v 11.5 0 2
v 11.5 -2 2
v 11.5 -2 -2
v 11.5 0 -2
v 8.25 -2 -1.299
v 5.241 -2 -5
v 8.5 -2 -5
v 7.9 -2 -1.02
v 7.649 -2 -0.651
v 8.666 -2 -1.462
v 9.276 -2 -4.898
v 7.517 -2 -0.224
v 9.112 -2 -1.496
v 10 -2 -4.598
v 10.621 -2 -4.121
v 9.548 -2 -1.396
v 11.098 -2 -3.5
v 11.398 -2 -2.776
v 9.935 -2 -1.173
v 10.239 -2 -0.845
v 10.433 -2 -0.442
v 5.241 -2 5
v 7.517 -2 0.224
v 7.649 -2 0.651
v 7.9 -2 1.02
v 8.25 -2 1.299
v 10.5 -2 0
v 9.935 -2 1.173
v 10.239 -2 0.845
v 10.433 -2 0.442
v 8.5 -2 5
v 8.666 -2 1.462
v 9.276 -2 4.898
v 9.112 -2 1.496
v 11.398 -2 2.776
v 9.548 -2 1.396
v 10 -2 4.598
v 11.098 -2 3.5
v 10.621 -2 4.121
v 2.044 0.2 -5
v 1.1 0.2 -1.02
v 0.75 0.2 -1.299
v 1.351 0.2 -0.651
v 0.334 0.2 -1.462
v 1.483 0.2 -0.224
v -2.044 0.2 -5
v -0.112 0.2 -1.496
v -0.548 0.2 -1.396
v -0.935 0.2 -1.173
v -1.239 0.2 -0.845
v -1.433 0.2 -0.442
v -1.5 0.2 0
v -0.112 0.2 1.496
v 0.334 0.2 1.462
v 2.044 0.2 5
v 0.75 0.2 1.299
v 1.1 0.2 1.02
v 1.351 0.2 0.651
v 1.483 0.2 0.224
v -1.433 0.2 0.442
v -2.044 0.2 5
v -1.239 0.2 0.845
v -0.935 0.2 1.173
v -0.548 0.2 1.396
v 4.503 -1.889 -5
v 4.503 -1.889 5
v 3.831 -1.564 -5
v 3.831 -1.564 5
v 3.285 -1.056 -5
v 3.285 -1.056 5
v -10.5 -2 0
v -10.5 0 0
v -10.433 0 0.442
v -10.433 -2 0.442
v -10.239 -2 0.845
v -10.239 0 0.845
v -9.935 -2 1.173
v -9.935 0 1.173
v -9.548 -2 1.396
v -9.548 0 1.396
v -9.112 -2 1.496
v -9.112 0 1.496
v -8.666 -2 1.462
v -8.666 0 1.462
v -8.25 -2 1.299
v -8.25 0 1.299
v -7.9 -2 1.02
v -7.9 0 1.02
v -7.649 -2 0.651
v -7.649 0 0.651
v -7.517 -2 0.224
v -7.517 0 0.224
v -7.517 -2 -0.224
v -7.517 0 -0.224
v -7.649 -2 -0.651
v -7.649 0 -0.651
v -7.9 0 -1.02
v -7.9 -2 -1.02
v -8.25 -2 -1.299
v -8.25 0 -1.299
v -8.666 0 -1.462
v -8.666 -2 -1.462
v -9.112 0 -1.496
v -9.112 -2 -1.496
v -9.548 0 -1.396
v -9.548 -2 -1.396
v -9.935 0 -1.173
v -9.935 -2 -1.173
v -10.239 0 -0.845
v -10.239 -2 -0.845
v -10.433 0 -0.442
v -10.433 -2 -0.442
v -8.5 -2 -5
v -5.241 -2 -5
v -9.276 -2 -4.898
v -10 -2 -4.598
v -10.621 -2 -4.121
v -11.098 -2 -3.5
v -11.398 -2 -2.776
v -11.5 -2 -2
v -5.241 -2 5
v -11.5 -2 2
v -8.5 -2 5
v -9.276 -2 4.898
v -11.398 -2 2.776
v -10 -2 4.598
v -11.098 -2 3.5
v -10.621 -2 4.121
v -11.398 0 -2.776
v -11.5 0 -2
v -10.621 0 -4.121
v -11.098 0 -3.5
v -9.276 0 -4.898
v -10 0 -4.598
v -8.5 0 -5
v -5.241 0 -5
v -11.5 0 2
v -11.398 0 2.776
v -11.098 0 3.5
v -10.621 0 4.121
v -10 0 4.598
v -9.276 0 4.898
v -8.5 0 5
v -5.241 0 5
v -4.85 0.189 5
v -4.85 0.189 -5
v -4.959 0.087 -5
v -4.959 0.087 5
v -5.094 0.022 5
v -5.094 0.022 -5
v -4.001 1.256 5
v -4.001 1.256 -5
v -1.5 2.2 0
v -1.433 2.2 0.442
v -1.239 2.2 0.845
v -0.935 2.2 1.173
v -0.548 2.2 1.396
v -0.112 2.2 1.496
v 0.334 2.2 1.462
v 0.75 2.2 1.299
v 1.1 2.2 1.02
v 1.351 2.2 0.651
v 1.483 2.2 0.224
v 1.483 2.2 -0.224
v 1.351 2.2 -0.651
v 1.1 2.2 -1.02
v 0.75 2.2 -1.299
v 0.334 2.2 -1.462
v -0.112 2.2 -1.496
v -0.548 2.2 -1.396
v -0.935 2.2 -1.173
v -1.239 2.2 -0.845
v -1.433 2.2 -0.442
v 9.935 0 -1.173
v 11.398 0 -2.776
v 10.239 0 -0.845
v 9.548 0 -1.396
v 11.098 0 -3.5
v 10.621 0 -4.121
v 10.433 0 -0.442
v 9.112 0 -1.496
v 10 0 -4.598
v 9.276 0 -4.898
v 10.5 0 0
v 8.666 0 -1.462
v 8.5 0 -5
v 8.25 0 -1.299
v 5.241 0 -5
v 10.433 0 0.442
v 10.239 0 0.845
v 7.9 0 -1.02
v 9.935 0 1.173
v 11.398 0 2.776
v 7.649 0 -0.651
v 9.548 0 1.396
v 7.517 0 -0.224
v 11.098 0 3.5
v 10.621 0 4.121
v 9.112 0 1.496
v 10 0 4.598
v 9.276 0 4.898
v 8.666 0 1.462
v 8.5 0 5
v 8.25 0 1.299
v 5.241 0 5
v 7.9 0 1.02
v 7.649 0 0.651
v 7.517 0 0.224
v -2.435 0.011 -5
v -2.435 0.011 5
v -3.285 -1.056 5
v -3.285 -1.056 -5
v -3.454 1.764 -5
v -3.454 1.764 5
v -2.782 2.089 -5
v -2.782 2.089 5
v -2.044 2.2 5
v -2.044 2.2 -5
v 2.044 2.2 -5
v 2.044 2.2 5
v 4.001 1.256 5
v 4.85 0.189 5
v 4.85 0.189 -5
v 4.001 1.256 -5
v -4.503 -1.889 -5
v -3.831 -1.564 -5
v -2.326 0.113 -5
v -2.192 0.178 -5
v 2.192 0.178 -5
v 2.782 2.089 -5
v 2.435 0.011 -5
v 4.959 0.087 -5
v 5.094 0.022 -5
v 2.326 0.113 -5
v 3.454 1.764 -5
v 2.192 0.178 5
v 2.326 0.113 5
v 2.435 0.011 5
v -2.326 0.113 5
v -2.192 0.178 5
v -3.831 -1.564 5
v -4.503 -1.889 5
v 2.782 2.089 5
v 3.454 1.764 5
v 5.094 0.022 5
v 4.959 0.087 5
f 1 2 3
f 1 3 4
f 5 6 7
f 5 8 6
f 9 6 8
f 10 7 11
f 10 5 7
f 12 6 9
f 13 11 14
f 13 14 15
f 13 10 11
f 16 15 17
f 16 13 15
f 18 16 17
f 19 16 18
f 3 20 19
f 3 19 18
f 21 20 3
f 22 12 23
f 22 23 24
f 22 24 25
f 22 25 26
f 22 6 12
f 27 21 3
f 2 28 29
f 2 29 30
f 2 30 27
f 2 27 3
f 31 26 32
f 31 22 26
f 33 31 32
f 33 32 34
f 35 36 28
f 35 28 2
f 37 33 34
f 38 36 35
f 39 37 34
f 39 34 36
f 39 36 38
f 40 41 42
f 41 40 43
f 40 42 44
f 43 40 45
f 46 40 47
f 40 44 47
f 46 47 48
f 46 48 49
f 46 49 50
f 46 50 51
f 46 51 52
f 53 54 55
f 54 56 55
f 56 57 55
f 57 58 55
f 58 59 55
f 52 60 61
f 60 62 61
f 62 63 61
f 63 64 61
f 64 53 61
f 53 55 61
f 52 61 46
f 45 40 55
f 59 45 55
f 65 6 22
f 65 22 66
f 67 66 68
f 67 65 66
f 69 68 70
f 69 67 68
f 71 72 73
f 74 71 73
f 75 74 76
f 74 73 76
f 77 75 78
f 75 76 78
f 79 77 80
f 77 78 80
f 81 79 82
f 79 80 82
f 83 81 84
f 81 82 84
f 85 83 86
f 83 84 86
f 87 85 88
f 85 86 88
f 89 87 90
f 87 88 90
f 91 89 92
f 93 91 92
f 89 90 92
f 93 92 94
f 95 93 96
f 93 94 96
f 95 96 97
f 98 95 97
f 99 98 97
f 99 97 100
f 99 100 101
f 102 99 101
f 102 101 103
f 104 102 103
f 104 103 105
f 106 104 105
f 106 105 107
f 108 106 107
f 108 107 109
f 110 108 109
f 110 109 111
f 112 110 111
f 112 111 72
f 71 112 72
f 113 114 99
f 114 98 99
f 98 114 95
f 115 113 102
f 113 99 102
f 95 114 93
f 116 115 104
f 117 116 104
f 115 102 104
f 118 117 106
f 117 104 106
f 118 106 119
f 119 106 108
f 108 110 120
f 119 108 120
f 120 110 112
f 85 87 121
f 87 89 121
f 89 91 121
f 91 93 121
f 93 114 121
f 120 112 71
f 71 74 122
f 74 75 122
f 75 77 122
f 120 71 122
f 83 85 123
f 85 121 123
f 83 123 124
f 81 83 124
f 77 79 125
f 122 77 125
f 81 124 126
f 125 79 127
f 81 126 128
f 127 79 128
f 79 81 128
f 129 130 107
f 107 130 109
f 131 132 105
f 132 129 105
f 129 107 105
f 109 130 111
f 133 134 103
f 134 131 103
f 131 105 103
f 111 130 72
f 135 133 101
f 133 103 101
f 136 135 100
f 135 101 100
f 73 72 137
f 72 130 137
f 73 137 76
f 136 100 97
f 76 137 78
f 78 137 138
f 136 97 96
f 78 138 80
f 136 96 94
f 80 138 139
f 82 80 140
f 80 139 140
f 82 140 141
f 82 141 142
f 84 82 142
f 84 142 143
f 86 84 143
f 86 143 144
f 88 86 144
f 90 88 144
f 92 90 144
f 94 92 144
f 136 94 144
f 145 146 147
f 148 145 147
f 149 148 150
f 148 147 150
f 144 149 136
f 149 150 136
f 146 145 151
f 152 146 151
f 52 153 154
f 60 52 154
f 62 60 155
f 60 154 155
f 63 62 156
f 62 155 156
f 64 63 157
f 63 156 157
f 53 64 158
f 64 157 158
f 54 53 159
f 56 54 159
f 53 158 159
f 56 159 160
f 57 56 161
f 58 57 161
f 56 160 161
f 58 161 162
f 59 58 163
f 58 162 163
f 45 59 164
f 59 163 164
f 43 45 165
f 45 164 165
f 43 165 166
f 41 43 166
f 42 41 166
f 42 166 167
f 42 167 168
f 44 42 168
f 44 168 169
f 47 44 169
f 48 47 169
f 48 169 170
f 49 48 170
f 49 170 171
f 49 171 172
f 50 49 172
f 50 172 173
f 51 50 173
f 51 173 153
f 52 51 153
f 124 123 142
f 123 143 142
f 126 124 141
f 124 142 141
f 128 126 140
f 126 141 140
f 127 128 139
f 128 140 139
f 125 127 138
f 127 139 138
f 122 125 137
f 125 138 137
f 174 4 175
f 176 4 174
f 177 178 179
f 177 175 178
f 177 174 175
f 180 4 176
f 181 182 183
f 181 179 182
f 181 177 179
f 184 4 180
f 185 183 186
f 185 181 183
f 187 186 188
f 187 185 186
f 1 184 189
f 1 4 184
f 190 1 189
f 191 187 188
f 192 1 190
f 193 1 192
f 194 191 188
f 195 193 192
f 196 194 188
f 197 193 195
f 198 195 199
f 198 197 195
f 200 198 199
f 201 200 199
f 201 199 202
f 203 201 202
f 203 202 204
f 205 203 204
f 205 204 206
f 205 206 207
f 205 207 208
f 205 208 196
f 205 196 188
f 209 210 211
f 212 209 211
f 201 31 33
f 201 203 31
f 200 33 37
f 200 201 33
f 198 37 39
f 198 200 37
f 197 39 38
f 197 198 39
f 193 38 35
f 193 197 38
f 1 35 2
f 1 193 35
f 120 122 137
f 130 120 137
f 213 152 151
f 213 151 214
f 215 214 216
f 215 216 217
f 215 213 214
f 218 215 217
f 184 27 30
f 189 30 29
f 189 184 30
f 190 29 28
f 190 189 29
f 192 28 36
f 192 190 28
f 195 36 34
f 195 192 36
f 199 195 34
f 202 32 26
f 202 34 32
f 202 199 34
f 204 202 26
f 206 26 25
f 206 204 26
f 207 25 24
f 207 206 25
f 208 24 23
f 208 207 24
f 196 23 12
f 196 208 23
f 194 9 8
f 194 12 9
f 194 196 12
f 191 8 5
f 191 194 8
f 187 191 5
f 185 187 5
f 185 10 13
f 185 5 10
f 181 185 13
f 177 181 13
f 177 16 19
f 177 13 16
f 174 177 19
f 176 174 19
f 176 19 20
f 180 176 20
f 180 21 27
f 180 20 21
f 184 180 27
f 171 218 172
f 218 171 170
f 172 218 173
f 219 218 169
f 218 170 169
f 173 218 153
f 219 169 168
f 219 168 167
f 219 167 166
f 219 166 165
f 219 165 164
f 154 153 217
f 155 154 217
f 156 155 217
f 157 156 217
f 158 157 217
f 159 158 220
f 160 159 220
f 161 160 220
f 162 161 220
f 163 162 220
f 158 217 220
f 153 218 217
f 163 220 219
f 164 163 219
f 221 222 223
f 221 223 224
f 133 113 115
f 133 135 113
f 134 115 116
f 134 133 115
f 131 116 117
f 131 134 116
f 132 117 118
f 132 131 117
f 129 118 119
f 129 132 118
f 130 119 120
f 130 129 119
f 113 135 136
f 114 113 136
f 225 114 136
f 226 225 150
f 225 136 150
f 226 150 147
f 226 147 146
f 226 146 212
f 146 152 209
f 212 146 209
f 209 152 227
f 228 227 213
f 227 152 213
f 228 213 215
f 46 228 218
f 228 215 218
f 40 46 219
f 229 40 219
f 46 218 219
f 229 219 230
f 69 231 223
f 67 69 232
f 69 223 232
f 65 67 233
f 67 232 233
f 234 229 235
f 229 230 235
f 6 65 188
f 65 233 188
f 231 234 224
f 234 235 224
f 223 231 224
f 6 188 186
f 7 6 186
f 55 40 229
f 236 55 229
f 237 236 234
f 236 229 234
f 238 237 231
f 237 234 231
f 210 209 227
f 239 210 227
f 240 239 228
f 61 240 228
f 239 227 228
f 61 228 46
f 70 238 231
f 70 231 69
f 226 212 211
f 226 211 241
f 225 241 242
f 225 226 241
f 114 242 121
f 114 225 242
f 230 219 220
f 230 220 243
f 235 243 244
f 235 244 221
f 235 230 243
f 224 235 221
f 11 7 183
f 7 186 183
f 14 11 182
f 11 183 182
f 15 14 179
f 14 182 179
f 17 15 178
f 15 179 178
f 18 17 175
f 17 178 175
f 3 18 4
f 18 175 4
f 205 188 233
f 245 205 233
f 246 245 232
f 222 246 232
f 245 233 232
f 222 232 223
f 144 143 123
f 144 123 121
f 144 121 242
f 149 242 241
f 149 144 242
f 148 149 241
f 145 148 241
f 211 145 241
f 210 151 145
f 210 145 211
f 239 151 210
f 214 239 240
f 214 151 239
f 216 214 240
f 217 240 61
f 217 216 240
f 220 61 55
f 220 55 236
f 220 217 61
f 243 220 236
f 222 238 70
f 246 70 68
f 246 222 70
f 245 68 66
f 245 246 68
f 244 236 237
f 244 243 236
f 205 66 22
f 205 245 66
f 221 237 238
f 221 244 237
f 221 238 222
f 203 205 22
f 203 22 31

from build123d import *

# Parameters (mm, degrees)
MAIN_BODY_DEPTH         = 5
CONVERT_SOLID1_START    = -5
CONVERT_SOLID1_DEPTH    = 10
CONVERT_SOLID1_2_DEPTH  = 10
SKETCH6_R               = 1.5
MIDDLE_RIVET_HOLE_DEPTH = 14.224598293
SKETCH7_R               = 1.5
LEFT_RIVET_HOLE_DEPTH   = 13.731457104
FILLET1_R               = 3


# Read off the part's stored shape, not the designer's step: Convert-Solid1
with BuildPart() as part:
    # Sketch1 → MAIN BODY (new, symmetric)
    with BuildSketch(Plane.XY):
        Polygon((11.5, 0), (5, 0), (3.25, 2.2), (0, 2.2), (0, 0.2), (2.285328582, 0.2), (4.035328582, -2), (11.5, -2), align=None)
    main_body = extrude(amount=MAIN_BODY_DEPTH, both=True)

    # Mirror1: MAIN BODY across plane
    add(main_body.mirror(Plane(origin=(0, 0, 0), x_dir=(0, 0, 1), z_dir=(1, 0, 0))))

    # Convert-Solid1 outline → Convert-Solid1 (cut)
    with BuildSketch(Plane.XY.offset(CONVERT_SOLID1_START)):
        with BuildLine():
            ThreePointArc((-4.000663363, 1.256308915), (-3.130261025, 1.951751794), (-2.044160728, 2.2))
            Line((-2.044160728, 2.2), (-3.25, 2.2))
            Line((-3.25, 2.2), (-4.000663363, 1.256308915))
        make_face()
        with BuildLine():
            ThreePointArc((2.044160728, 2.2), (3.130261025, 1.951751794), (4.000663363, 1.256308915))
            Line((4.000663363, 1.256308915), (3.25, 2.2))
            Line((3.25, 2.2), (2.044160728, 2.2))
        make_face()
        with BuildLine():
            Line((-4.035328582, -2), (-3.284665219, -1.056308915))
            ThreePointArc((-3.284665219, -1.056308915), (-4.155067557, -1.751751794), (-5.241167854, -2))
            Line((-5.241167854, -2), (-4.035328582, -2))
        make_face()
        with BuildLine():
            ThreePointArc((5.241167854, -2), (4.155067557, -1.751751794), (3.284665219, -1.056308915))
            Line((3.284665219, -1.056308915), (4.035328582, -2))
            Line((4.035328582, -2), (5.241167854, -2))
        make_face()
    extrude(amount=CONVERT_SOLID1_DEPTH, mode=Mode.SUBTRACT)

    # Convert-Solid1 2 outline → Convert-Solid1 2 (add)
    with BuildSketch(Plane.XY.offset(CONVERT_SOLID1_START)):
        with BuildLine():
            Line((-5, 0), (-4.849867327, 0.188738217))
            ThreePointArc((-4.849867327, 0.188738217), (-5.023947795, 0.049649641), (-5.241167854, 0))
            Line((-5.241167854, 0), (-5, 0))
        make_face()
        with BuildLine():
            ThreePointArc((5.241167854, 0), (5.023947795, 0.049649641), (4.849867327, 0.188738217))
            Line((4.849867327, 0.188738217), (5, 0))
            Line((5, 0), (5.241167854, 0))
        make_face()
        with BuildLine():
            ThreePointArc((-2.435461255, 0.011261783), (-2.261380788, 0.150350359), (-2.044160728, 0.2))
            Line((-2.044160728, 0.2), (-2.285328582, 0.2))
            Line((-2.285328582, 0.2), (-2.435461255, 0.011261783))
        make_face()
        with BuildLine():
            ThreePointArc((2.044160728, 0.2), (2.261380788, 0.150350359), (2.435461255, 0.011261783))
            Line((2.435461255, 0.011261783), (2.285328582, 0.2))
            Line((2.285328582, 0.2), (2.044160728, 0.2))
        make_face()
    extrude(amount=CONVERT_SOLID1_2_DEPTH)

    # Sketch6 → MIDDLE RIVET HOLE (cut, through all)
    with BuildSketch(Plane(origin=(0, 2.2, 0), x_dir=(1, 0, 0), z_dir=(0, 1, 0))):
        with Locations(Location((0, 0, 0), (0, 0, 180))):
            Circle(SKETCH6_R)
    extrude(amount=-MIDDLE_RIVET_HOLE_DEPTH, mode=Mode.SUBTRACT)

    # Sketch7 → LEFT RIVET HOLE (cut, through all)
    with BuildSketch(Plane(origin=(0, 0, 0), x_dir=(1, 0, 0), z_dir=(0, 1, 0))):
        with Locations(Location((-9, 0, 0), (0, 0, 180))):
            Circle(SKETCH7_R)
    left_rivet_hole = extrude(amount=-LEFT_RIVET_HOLE_DEPTH, mode=Mode.SUBTRACT)

    # RIGHT RIVET HOLE: LEFT RIVET HOLE across plane
    add(left_rivet_hole.mirror(Plane(origin=(0, 0, 0), x_dir=(0, 0, 1), z_dir=(1, 0, 0))), mode=Mode.SUBTRACT)

    # Fillet1
    fillet1_edges = [part.edges().sort_by_distance(p)[0] for p in [
        (11.5, -1, -5),
        (11.5, -1, 5),
        (-11.5, -1, 5),
        (-11.5, -1, -5),
    ]]
    fillet(fillet1_edges, radius=FILLET1_R)


solid = part.part
